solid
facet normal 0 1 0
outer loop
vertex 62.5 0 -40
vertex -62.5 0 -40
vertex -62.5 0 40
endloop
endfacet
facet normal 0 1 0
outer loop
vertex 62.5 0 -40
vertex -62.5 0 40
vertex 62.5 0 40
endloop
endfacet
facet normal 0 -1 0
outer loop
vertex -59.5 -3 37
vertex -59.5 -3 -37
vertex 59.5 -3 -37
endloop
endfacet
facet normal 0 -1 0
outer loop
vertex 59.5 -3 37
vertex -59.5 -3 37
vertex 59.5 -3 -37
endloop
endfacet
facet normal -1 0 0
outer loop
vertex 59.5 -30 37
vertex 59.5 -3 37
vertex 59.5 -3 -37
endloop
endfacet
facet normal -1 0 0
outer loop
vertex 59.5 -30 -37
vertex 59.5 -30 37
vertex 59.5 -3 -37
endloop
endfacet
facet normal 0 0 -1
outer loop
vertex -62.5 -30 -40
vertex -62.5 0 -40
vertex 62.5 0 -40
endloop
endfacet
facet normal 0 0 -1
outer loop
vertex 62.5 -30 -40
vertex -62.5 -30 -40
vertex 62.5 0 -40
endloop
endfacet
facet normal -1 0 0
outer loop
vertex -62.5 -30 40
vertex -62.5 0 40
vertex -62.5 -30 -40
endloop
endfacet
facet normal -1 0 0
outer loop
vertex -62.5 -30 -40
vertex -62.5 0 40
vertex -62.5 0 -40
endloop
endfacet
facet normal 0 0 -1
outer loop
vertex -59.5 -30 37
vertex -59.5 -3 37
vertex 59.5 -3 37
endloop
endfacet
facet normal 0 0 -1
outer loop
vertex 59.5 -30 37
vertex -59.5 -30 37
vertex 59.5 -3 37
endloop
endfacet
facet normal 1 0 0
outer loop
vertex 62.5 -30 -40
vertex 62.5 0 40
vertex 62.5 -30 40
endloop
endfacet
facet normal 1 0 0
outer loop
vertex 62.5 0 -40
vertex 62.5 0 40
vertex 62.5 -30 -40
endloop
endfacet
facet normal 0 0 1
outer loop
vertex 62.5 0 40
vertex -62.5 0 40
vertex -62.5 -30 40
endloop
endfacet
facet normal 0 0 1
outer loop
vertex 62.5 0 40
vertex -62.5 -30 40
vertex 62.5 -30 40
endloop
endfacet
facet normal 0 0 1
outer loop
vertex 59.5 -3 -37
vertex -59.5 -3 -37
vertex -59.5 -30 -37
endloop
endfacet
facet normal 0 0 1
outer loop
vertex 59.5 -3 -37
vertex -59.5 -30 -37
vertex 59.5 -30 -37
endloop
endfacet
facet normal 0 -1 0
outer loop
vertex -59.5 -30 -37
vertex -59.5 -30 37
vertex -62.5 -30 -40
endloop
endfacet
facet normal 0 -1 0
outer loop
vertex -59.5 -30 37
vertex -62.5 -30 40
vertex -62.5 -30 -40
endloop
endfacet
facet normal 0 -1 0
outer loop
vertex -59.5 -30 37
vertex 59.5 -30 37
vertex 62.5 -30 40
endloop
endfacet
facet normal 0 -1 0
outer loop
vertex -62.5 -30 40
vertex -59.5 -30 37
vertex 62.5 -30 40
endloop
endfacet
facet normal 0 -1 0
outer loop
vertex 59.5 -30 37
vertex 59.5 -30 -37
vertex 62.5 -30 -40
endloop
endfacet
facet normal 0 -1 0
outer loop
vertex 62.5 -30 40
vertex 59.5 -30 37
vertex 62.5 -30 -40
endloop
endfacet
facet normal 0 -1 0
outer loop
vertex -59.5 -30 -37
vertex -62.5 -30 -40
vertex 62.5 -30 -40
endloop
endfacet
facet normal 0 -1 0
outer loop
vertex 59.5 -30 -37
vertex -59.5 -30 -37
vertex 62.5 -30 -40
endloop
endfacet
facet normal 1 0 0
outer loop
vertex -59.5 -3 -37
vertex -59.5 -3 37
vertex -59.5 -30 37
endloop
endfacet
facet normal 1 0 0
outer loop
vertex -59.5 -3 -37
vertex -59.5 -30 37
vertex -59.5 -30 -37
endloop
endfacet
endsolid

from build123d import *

# Parameters (mm, degrees)
SZKIC1_W                    = 125
SZKIC1_H                    = 80
DODANIE_WYCI_GNI_CIE1_DEPTH = 30
SKORUPA2_T                  = -3


with BuildPart() as part:
    # Szkic1 → Dodanie-wyciągnięcie1 (new body)
    with BuildSketch(Plane(origin=(0, 0, 0), x_dir=(1, 0, 0), z_dir=(0, 1, 0))):
        Rectangle(SZKIC1_W, SZKIC1_H)
    extrude(amount=-DODANIE_WYCI_GNI_CIE1_DEPTH)

    # Skorupa2
    skorupa2_openings = [part.faces().sort_by_distance(p)[0] for p in [
        (0, -30, 0),
    ]]
    offset(amount=SKORUPA2_T, openings=skorupa2_openings, kind=Kind.INTERSECTION)


solid = part.part
